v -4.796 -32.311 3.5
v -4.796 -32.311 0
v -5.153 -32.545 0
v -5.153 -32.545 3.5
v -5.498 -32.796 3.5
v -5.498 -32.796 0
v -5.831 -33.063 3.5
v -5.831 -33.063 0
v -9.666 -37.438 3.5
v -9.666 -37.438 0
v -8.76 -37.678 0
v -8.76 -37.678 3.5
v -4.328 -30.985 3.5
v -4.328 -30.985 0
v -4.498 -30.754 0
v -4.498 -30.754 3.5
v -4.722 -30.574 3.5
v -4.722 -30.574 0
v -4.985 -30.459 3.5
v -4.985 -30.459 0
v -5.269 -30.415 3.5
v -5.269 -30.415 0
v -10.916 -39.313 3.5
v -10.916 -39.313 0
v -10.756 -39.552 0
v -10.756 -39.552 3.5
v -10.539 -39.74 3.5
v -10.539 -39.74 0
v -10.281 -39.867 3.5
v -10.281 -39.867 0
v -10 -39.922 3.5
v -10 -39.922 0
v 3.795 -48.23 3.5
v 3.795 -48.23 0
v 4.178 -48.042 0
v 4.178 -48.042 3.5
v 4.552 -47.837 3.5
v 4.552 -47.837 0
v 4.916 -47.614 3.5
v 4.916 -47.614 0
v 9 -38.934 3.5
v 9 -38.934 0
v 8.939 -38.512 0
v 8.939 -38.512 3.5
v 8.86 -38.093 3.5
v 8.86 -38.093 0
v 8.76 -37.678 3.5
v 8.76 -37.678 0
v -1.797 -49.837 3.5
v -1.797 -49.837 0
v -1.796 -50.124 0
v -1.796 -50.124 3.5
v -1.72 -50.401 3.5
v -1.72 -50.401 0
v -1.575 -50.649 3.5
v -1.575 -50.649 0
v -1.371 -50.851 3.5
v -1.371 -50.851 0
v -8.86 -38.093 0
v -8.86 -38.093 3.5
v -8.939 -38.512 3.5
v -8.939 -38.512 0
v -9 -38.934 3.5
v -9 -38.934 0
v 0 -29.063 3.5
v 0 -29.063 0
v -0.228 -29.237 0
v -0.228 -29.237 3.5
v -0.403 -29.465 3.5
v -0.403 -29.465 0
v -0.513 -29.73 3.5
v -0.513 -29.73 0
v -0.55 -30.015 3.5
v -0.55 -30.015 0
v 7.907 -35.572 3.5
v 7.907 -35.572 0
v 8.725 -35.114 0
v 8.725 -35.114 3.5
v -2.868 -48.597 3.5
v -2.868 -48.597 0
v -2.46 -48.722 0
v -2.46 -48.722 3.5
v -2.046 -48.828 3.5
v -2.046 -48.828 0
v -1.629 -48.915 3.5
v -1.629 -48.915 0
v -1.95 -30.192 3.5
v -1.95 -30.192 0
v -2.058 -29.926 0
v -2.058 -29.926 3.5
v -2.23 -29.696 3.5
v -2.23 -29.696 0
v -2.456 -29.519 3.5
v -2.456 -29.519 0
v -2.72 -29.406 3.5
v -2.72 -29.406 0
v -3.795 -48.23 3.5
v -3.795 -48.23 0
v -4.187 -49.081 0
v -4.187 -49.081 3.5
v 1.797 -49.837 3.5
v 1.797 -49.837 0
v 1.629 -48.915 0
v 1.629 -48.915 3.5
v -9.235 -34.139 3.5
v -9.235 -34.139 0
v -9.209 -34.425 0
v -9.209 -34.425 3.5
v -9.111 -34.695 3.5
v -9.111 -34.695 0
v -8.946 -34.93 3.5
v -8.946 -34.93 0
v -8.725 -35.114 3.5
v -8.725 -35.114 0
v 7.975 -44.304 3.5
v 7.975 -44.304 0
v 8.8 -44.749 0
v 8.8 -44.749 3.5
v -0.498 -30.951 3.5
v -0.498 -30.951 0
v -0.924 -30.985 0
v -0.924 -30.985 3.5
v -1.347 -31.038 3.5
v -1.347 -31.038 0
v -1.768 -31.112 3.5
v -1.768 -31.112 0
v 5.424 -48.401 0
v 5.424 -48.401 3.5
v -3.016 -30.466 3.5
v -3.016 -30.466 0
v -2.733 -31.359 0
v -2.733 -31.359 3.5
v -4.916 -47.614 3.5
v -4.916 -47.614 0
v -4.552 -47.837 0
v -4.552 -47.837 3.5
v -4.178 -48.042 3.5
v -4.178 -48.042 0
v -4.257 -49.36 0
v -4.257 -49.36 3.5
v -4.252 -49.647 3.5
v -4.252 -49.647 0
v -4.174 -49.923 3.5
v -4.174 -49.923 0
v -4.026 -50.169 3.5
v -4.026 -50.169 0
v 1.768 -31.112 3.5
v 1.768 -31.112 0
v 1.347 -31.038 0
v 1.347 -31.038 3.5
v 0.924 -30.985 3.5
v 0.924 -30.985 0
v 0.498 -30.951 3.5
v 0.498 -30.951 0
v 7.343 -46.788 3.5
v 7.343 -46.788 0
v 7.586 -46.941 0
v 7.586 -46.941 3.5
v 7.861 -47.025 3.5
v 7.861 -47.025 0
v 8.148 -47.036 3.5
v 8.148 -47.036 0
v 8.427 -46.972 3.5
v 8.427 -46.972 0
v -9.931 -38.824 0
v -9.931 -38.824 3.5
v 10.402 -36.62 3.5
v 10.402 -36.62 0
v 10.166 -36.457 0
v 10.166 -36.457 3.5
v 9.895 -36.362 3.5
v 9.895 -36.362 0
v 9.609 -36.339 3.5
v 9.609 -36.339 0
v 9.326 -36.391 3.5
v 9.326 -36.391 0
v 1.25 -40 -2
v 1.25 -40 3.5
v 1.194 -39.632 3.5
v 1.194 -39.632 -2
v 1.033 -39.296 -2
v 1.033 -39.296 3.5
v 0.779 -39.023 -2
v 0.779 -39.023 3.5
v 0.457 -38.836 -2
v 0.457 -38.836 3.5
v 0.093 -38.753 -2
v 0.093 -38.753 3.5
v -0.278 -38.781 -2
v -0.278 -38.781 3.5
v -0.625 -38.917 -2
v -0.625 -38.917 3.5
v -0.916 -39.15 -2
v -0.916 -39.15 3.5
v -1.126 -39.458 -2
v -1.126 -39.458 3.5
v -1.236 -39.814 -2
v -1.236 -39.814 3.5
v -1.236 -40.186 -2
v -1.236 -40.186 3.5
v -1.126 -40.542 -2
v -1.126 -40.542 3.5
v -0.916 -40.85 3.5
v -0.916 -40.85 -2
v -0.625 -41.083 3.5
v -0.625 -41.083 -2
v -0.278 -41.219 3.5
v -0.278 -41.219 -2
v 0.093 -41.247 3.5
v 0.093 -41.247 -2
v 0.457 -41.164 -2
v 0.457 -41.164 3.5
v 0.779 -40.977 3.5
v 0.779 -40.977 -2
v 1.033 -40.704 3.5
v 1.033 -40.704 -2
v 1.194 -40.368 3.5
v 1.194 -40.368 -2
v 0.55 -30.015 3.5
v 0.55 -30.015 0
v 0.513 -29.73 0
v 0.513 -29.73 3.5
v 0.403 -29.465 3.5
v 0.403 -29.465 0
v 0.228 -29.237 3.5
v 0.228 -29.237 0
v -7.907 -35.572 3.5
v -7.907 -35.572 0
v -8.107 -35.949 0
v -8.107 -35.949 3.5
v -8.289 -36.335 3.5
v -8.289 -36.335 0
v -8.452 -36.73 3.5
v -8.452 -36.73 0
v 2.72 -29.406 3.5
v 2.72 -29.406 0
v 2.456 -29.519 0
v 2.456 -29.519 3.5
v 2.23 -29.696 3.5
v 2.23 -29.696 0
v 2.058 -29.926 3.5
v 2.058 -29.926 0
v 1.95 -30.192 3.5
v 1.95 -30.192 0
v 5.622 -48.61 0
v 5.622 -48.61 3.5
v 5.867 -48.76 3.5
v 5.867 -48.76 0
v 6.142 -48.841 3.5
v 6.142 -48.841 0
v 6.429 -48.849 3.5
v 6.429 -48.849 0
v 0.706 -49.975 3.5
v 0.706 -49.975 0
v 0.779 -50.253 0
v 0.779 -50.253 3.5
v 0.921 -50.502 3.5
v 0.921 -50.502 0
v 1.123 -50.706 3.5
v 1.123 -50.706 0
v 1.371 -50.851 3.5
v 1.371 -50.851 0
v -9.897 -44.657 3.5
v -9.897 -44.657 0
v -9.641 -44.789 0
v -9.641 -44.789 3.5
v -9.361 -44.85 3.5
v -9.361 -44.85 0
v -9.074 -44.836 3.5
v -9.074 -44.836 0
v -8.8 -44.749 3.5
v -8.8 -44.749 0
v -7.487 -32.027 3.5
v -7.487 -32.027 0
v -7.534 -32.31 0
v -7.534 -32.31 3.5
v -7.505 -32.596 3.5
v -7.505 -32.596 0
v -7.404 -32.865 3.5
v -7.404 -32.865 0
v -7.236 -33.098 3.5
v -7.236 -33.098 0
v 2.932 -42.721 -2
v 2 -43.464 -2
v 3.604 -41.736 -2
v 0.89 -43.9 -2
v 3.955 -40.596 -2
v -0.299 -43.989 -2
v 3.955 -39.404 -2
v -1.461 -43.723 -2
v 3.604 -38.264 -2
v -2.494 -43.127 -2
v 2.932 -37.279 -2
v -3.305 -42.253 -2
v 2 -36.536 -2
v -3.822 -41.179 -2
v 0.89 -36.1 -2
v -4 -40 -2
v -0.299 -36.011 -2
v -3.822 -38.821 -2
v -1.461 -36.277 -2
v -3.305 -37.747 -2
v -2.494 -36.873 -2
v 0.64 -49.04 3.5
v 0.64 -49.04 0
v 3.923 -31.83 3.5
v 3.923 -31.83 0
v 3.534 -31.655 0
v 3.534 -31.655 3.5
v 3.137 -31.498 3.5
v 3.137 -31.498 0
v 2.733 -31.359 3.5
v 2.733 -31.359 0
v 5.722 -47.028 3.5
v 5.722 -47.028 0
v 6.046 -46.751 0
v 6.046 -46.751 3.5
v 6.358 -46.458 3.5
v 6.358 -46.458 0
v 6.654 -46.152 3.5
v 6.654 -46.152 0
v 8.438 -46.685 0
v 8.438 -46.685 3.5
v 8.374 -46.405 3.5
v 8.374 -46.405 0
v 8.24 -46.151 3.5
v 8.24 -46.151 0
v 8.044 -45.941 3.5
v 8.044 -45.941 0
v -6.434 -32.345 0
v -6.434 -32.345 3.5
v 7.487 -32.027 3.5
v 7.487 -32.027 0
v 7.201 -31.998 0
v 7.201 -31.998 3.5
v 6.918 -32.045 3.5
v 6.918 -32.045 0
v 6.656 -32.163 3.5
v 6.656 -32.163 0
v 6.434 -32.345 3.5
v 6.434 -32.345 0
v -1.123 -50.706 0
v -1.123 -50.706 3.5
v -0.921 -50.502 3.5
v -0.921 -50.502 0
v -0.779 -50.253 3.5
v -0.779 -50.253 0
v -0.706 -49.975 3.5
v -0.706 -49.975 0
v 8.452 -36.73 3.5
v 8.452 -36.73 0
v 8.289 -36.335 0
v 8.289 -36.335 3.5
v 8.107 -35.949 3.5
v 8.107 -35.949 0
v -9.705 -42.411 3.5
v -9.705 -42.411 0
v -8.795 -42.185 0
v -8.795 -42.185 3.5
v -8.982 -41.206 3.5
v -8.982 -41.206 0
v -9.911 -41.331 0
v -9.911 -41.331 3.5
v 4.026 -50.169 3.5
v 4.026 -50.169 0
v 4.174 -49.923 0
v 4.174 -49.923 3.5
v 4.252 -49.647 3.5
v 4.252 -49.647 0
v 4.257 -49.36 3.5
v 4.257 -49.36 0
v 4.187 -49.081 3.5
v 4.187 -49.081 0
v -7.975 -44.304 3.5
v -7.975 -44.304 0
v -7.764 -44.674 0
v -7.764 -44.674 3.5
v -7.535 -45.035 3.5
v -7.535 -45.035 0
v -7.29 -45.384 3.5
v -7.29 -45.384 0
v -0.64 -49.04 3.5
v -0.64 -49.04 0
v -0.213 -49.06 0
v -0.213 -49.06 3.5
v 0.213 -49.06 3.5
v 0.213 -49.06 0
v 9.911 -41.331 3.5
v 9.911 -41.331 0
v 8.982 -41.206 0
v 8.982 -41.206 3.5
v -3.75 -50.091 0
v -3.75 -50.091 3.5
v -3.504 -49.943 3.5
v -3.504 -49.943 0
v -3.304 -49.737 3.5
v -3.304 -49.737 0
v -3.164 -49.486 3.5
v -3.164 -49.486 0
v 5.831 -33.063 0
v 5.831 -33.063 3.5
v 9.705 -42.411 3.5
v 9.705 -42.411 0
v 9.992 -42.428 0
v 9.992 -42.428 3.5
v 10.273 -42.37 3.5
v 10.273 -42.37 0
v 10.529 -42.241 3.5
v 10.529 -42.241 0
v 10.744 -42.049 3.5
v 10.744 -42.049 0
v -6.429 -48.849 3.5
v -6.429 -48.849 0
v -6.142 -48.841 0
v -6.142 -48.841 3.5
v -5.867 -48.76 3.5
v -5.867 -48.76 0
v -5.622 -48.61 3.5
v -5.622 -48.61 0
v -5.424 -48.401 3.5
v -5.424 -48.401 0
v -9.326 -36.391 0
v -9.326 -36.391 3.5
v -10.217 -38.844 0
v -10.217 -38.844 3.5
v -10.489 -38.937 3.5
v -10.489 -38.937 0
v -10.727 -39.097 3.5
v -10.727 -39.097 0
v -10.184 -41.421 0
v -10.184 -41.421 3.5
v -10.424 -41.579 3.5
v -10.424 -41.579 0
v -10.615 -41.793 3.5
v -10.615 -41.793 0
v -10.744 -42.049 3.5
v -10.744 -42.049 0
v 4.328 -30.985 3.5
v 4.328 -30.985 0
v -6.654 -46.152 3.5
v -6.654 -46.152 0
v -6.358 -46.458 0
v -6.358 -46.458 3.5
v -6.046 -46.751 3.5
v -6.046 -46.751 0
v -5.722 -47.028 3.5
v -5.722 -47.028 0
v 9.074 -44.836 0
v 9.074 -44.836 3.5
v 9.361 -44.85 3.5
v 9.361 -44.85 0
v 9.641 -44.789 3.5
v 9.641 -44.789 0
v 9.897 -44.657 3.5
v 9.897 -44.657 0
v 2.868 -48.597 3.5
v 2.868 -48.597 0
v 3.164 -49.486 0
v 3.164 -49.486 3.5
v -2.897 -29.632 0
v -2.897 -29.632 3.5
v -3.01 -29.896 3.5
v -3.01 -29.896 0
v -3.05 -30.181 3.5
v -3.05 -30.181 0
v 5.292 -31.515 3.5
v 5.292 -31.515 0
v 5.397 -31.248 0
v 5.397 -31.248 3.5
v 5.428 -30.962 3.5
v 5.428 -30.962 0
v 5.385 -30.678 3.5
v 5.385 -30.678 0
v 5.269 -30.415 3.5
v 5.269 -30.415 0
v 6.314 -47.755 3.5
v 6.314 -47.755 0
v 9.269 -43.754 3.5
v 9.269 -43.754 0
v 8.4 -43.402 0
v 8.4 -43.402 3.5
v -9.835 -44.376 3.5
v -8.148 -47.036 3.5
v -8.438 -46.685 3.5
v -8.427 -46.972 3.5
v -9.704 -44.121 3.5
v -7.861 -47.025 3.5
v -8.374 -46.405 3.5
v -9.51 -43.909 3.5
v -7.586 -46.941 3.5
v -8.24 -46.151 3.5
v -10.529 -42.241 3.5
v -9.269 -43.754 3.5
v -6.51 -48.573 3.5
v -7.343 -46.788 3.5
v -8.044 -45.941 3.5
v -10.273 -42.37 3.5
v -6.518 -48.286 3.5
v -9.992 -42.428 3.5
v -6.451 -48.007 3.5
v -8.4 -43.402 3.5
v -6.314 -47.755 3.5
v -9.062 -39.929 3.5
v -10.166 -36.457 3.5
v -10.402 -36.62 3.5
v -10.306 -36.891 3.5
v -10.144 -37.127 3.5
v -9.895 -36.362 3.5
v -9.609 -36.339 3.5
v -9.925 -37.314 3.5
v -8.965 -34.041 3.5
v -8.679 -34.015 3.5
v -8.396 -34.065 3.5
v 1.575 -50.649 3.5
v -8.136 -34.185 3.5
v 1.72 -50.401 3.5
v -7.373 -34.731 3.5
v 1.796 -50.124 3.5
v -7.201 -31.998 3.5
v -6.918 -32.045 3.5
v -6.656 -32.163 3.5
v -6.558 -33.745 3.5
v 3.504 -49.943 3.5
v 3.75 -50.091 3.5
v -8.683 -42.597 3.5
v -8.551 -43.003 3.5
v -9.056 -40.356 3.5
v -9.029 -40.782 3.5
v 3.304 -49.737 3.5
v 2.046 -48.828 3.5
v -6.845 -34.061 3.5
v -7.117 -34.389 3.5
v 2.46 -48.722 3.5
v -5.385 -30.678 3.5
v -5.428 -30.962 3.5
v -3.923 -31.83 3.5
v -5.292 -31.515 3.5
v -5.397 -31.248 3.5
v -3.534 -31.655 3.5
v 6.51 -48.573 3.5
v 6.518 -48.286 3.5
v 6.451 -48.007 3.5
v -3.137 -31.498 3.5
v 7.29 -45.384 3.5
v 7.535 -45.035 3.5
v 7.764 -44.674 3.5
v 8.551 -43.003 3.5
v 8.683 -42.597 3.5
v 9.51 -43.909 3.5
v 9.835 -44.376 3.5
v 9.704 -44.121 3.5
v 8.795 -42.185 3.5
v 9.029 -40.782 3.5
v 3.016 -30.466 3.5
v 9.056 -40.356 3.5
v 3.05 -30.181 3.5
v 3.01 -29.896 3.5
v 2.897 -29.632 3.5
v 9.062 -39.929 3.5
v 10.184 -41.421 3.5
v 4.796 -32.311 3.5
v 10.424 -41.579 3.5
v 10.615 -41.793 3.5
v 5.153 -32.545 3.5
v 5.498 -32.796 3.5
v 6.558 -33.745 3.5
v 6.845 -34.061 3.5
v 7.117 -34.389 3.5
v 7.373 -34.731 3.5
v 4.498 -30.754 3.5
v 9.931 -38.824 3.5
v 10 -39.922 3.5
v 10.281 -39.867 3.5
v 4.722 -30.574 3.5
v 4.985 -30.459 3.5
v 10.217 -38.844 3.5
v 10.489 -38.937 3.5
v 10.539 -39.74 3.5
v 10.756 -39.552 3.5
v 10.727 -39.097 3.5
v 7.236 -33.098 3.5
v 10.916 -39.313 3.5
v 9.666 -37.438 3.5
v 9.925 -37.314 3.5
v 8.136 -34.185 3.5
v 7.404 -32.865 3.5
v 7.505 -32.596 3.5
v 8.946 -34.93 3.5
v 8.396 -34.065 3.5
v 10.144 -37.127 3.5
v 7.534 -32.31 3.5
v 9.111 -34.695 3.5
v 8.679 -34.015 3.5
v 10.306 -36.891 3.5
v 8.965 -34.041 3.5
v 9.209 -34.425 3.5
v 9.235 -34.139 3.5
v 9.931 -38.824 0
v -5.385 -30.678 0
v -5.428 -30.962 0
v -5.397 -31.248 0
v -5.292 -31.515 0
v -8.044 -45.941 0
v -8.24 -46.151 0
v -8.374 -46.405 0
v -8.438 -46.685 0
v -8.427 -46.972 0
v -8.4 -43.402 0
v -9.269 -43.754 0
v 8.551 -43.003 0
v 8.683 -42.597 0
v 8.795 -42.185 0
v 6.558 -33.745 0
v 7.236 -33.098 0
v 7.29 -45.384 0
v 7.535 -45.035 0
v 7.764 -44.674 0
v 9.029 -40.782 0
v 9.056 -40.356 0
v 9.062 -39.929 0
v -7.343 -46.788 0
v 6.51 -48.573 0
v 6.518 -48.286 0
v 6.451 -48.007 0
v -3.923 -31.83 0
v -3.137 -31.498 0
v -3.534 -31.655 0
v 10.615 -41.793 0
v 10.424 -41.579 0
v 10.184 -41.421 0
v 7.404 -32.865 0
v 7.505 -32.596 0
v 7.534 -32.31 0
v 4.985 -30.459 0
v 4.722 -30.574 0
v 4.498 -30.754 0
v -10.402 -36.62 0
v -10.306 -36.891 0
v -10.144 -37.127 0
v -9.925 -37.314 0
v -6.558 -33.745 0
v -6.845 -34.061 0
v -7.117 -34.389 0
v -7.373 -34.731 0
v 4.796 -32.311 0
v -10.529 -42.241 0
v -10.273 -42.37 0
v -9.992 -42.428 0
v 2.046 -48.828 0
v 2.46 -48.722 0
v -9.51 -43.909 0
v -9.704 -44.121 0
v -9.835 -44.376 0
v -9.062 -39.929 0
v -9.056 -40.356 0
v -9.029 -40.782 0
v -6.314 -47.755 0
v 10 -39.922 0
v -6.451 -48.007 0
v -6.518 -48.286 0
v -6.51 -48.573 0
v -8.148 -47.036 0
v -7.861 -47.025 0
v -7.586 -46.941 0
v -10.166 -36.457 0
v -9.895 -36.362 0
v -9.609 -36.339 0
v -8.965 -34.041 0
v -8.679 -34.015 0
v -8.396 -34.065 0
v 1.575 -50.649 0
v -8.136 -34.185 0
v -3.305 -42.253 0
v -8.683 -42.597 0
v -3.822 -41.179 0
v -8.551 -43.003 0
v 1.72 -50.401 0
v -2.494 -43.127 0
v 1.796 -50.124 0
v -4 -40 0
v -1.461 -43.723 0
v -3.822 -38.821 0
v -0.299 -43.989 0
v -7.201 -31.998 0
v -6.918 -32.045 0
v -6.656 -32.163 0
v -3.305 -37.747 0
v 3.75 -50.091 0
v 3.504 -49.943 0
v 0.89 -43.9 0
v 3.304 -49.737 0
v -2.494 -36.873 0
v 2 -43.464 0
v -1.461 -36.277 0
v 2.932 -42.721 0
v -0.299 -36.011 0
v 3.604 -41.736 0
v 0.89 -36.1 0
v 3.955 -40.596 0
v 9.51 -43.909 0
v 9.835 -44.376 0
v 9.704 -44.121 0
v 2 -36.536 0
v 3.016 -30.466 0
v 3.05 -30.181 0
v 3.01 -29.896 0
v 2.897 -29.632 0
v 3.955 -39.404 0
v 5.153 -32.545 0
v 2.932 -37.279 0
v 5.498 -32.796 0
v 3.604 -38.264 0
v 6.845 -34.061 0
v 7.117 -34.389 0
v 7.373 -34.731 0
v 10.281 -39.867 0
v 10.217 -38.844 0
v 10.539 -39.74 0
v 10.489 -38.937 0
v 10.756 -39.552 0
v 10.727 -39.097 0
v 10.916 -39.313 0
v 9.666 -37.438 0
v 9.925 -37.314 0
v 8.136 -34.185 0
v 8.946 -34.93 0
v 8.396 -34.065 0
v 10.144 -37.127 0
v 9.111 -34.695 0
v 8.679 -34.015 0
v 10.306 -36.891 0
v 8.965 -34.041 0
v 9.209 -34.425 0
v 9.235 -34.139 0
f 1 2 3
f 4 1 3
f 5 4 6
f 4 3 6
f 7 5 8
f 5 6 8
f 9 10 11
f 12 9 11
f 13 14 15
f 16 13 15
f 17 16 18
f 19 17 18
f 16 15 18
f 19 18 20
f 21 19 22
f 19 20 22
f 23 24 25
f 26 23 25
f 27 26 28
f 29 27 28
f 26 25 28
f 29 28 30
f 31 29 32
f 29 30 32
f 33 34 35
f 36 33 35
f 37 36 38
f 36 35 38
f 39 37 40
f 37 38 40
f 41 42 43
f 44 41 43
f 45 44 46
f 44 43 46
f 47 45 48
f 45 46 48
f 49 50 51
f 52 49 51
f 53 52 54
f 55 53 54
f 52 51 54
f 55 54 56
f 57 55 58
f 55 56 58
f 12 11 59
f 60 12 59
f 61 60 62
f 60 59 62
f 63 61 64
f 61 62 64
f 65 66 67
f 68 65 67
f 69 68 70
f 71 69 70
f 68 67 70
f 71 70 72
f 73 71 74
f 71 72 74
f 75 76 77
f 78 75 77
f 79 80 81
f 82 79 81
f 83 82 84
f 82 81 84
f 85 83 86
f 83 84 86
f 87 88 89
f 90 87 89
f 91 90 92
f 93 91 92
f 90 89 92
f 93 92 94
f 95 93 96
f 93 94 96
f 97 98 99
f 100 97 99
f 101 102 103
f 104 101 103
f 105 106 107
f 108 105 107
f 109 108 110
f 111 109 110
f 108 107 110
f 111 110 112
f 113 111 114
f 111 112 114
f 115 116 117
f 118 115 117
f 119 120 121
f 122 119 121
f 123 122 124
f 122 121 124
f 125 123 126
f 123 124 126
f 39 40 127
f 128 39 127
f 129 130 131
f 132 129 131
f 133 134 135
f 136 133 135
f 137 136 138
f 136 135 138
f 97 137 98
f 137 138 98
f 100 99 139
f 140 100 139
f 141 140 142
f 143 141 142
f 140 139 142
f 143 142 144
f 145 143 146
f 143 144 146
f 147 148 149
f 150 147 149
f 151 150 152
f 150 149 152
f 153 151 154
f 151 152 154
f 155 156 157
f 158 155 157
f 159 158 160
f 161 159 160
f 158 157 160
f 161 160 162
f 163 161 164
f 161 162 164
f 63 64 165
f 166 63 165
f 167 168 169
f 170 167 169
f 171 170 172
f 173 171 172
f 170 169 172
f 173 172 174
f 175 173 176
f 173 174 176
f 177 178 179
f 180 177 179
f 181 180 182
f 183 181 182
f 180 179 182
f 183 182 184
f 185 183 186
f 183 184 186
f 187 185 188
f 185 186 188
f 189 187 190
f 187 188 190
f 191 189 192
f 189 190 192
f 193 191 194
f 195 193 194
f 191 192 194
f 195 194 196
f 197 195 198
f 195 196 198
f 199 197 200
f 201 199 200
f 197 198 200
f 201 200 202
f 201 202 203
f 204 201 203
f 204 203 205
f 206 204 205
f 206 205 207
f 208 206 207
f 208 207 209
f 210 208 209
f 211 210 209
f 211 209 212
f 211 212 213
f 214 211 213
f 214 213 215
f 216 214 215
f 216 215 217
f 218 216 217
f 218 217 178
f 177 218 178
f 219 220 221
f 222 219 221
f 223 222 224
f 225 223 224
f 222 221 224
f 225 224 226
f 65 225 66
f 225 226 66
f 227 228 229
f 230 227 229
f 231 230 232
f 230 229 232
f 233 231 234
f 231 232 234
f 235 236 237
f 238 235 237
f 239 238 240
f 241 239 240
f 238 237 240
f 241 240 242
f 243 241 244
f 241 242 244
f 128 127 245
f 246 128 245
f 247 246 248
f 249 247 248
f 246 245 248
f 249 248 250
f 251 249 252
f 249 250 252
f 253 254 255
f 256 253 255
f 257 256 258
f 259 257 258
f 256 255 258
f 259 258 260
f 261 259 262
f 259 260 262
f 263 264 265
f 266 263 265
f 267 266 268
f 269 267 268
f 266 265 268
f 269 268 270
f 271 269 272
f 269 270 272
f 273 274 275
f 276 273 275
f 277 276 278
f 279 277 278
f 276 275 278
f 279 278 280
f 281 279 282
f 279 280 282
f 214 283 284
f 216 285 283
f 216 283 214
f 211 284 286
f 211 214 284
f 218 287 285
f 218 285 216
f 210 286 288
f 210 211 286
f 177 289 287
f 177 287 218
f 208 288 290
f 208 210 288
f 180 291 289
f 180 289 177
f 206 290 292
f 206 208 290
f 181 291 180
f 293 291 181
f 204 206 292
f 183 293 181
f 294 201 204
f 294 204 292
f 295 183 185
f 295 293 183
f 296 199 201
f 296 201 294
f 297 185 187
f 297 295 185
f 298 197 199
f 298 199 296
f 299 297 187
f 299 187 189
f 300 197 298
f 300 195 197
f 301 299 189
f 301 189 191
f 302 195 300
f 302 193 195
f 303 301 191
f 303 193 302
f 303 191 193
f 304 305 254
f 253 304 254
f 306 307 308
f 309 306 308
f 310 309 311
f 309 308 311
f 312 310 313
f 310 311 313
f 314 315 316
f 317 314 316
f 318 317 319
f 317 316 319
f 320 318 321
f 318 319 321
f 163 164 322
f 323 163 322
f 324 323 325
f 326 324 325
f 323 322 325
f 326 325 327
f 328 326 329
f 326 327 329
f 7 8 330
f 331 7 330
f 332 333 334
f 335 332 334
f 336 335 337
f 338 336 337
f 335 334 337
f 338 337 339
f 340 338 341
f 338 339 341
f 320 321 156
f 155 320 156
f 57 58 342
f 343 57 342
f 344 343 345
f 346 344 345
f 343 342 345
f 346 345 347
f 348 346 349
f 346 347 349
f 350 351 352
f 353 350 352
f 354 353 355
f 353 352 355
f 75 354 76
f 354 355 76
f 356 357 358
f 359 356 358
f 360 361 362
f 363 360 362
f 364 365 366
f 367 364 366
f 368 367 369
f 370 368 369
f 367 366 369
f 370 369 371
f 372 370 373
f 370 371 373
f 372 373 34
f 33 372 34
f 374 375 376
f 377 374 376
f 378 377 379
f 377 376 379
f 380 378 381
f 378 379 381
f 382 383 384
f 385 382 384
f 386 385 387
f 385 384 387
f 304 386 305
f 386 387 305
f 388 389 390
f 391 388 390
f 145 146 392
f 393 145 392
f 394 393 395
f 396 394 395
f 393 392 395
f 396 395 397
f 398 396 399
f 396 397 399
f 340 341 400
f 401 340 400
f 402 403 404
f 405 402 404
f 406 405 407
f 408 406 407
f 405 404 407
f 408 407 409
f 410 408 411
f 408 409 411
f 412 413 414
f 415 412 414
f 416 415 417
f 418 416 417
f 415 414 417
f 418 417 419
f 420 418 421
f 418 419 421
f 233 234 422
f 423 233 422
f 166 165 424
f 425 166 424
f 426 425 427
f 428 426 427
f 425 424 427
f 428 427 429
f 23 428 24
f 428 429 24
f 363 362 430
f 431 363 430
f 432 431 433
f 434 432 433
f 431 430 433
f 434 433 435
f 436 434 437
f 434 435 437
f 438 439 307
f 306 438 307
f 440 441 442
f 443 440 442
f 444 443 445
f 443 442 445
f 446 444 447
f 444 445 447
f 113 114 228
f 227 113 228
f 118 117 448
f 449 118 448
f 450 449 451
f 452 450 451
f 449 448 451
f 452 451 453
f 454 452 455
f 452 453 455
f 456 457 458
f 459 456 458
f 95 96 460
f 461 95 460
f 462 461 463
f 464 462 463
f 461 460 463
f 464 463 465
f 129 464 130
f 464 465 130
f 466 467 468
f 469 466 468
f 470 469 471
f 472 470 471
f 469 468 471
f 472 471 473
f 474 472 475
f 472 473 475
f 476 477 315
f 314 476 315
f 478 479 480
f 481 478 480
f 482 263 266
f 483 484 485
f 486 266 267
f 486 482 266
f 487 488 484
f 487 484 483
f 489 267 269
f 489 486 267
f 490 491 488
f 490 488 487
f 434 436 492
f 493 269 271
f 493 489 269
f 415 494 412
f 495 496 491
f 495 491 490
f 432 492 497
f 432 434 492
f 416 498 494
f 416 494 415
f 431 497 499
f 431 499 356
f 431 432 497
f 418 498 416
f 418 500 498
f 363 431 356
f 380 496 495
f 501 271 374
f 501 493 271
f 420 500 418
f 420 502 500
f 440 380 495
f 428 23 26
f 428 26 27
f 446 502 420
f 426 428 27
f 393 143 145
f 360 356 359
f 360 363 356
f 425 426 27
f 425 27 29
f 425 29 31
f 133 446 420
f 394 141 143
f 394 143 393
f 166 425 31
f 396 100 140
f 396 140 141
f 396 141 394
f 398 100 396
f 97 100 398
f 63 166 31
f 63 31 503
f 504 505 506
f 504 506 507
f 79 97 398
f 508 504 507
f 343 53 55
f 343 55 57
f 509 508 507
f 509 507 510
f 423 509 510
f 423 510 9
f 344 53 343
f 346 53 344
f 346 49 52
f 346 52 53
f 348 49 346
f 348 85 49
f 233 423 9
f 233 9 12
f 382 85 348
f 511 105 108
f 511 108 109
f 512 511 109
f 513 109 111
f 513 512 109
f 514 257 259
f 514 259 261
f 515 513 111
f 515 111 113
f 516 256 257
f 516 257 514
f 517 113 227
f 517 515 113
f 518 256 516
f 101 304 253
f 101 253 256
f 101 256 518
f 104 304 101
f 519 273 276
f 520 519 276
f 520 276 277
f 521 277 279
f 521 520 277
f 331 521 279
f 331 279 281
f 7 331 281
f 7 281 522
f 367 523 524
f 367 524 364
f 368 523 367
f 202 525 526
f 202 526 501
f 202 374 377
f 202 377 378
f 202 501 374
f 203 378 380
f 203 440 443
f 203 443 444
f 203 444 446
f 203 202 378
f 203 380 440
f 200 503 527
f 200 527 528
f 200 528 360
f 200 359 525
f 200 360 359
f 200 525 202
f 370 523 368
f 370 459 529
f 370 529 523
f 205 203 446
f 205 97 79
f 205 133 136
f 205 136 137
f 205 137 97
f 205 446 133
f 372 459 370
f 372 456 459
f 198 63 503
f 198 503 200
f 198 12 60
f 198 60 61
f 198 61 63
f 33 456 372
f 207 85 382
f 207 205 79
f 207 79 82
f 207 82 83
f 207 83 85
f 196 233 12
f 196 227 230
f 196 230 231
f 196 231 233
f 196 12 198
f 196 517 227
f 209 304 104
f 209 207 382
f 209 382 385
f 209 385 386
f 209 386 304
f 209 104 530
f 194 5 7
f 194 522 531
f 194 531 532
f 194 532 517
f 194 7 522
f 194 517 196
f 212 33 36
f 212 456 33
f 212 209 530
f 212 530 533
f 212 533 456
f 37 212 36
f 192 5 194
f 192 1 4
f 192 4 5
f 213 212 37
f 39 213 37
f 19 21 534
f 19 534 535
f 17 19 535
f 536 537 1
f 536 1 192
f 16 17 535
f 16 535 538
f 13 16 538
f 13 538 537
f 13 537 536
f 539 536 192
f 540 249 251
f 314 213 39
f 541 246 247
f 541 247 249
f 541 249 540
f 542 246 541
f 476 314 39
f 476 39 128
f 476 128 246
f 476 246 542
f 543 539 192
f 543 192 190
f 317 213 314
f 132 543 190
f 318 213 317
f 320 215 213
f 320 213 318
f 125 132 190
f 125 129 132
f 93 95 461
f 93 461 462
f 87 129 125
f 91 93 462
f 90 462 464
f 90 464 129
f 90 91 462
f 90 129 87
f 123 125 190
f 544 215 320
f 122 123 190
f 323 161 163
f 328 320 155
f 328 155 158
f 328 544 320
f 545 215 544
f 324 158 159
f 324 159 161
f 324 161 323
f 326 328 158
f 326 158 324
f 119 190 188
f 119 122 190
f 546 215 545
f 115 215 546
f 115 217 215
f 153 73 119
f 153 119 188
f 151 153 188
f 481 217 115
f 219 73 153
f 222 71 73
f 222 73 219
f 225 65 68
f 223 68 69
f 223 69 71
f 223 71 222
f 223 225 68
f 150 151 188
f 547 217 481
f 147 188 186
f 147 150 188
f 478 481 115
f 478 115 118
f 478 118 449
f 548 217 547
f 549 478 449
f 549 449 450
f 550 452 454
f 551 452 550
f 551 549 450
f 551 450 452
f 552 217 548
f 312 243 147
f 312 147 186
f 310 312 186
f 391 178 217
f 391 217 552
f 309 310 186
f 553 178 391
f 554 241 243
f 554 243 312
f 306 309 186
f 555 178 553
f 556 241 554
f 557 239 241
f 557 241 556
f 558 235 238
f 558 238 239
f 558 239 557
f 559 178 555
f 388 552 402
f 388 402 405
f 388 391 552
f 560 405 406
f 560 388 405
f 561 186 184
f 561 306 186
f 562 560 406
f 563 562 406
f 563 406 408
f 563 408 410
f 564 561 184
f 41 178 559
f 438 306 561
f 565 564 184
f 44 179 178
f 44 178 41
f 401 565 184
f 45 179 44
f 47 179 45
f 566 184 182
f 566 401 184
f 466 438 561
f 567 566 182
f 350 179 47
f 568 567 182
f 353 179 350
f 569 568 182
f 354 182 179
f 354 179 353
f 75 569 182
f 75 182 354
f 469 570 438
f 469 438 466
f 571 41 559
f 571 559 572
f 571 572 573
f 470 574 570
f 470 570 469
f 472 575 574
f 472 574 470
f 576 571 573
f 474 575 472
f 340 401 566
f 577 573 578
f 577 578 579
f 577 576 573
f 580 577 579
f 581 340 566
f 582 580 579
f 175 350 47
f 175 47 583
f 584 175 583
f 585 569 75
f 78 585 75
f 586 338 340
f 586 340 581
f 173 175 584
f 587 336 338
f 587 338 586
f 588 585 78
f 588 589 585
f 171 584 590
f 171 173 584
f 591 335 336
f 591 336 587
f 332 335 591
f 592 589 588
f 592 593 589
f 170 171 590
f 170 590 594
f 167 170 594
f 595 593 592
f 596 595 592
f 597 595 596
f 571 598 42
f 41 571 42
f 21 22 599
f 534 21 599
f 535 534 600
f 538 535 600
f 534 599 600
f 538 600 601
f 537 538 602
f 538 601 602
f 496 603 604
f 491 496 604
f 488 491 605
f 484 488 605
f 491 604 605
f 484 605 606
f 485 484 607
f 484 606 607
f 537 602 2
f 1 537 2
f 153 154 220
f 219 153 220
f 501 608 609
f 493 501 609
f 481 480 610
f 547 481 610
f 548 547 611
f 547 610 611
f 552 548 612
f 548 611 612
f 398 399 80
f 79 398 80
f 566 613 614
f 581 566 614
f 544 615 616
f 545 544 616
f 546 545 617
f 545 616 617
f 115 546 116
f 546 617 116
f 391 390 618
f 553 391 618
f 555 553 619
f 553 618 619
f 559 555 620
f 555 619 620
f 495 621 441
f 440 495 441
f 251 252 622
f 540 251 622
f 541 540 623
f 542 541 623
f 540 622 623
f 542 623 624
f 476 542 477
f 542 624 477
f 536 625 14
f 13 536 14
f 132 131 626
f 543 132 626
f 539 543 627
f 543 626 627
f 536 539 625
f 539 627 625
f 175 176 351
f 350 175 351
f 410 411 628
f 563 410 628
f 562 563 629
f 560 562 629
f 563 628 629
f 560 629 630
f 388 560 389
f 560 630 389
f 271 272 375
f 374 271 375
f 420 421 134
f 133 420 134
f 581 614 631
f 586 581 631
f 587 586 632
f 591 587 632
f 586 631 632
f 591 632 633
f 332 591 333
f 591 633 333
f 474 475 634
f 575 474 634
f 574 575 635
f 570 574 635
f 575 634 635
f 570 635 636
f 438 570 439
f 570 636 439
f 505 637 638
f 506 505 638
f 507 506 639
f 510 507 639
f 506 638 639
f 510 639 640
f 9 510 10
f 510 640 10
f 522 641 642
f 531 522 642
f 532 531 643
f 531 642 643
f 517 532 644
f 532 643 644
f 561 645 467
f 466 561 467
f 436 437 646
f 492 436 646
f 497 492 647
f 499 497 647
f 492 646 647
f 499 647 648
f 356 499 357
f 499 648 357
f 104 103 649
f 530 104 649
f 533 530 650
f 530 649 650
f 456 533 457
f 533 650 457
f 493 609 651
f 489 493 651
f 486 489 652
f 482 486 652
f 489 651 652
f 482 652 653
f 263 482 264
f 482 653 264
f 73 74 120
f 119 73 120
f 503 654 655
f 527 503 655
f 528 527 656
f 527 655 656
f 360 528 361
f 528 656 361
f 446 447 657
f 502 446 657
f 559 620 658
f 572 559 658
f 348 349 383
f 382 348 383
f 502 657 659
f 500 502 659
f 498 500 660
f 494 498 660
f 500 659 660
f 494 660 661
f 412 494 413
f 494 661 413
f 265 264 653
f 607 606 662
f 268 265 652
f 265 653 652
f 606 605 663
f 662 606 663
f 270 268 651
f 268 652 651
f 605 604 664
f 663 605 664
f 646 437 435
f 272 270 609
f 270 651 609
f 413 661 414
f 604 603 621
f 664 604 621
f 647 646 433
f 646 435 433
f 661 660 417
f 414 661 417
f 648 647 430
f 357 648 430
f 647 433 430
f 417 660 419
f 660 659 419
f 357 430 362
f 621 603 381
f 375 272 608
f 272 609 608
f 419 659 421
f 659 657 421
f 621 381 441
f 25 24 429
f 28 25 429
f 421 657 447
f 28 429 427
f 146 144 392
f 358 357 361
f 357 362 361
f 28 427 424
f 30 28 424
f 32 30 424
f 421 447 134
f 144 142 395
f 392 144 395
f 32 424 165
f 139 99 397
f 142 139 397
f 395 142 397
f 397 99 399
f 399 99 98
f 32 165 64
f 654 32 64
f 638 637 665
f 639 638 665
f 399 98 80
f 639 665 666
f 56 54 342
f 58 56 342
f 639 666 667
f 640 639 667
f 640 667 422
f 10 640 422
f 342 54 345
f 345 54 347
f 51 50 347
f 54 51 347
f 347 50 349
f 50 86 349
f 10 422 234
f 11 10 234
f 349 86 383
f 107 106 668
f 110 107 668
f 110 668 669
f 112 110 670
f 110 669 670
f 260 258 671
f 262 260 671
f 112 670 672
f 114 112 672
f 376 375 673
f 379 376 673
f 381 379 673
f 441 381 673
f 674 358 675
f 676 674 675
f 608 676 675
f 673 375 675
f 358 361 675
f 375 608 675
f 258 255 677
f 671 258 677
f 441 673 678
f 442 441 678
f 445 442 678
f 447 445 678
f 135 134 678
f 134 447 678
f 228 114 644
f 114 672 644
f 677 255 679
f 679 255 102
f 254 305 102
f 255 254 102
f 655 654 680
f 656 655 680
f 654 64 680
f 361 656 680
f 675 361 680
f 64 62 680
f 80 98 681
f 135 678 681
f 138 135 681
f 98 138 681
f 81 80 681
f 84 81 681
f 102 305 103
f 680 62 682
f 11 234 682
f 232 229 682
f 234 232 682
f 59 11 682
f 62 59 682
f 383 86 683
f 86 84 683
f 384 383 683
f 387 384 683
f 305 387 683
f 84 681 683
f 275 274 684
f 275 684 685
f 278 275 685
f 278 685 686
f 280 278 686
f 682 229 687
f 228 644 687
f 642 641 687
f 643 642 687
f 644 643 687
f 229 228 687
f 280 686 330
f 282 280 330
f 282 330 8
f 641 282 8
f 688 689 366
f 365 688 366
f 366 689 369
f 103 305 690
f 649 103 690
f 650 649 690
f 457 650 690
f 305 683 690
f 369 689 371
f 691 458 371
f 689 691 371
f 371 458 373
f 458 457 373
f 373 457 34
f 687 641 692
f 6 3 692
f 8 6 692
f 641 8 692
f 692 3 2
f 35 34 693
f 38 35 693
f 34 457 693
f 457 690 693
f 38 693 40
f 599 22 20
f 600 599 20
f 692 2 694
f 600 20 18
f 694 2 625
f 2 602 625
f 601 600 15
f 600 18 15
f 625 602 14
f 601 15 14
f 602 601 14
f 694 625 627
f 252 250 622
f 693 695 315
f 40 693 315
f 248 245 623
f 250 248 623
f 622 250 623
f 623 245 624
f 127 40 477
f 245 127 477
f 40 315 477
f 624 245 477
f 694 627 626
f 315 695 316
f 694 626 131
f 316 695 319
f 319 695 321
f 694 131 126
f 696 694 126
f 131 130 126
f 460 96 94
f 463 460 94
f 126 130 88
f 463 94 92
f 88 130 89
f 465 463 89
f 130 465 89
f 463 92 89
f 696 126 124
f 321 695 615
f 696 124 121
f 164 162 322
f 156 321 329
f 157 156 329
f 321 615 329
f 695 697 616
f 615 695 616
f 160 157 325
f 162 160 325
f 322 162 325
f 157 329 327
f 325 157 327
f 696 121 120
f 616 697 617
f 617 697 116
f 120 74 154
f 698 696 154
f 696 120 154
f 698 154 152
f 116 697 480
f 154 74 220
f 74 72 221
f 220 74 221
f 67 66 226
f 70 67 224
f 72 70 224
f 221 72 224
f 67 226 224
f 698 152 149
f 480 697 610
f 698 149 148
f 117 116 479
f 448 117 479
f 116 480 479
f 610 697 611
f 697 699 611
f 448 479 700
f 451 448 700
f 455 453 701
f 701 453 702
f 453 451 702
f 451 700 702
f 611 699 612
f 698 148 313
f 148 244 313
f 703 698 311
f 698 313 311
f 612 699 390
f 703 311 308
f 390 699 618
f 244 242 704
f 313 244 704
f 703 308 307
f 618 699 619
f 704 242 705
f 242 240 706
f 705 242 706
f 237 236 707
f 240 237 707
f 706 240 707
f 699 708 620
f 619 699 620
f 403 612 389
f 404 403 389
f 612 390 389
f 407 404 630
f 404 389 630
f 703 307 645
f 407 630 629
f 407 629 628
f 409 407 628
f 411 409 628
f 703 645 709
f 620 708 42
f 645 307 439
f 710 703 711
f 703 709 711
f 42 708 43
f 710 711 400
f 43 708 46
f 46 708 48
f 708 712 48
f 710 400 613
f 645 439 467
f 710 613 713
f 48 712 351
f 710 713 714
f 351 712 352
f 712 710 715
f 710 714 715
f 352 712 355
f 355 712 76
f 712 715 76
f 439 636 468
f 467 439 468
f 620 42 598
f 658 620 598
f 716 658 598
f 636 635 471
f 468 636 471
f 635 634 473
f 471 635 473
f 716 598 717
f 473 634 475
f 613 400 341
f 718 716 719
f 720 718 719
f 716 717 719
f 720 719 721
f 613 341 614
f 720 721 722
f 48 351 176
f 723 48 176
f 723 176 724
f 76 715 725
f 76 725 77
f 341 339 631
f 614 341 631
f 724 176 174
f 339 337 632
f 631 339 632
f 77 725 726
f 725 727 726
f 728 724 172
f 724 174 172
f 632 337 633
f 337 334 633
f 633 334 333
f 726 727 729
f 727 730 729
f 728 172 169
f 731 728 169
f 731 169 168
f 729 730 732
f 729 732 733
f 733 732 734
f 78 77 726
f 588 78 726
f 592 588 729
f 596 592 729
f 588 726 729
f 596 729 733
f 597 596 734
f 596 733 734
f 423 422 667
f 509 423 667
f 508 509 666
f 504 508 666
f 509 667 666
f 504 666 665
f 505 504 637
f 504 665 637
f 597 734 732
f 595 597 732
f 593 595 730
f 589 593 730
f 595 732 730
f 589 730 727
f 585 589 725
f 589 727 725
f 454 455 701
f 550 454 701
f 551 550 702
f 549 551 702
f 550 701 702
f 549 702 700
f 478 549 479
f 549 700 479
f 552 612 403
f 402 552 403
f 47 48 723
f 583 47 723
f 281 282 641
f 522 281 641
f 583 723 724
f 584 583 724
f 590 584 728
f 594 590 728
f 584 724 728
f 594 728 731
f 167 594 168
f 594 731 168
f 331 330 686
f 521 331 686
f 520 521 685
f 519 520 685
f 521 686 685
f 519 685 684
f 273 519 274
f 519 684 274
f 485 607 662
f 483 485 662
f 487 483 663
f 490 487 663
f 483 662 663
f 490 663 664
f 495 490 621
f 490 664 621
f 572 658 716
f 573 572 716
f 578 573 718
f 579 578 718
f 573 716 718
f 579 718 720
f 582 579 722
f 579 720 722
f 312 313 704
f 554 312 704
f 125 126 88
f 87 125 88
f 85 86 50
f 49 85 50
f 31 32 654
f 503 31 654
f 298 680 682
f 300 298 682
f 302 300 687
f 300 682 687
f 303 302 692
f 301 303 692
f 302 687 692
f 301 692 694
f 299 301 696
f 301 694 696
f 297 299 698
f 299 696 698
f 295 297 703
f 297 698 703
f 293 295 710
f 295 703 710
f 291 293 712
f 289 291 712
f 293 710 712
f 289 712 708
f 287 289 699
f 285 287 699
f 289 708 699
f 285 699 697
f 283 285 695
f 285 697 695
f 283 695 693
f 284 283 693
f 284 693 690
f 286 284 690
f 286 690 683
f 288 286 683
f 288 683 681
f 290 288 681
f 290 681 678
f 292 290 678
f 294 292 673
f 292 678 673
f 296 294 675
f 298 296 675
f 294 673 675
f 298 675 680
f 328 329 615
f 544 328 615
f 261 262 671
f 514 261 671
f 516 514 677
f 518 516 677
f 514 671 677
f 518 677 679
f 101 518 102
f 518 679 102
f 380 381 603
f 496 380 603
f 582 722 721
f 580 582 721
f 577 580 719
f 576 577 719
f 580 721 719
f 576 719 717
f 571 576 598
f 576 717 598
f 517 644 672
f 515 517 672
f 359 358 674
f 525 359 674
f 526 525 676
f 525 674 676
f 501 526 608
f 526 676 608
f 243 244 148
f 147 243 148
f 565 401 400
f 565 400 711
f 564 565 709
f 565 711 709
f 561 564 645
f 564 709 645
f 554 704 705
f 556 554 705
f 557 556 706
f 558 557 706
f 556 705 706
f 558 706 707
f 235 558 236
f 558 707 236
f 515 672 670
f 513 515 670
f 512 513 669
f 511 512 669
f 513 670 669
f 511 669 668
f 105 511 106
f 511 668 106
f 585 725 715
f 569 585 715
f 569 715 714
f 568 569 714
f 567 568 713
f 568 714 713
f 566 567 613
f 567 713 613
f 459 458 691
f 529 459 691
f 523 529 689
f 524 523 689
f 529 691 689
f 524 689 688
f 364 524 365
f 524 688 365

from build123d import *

# Parameters (mm, degrees)
SKETCH1_R           = 9.062508511
BOSS_EXTRUDE1_DEPTH = 3.5
CIRPATTERN1_COUNT   = 25
SKETCH3_R           = 4
BOSS_EXTRUDE2_DEPTH = 2
SKETCH2_R           = 1.25
CUT_EXTRUDE1_DEPTH  = 6.5


with BuildPart() as part:
    # Sketch1 → Boss-Extrude1 (new body)
    with BuildSketch(Plane.XY):
        with BuildLine():
            ThreePointArc((0, -29.062508511), (-0.402627944, -29.465136456), (-0.55, -30.015136456))
            Line((-0.55, -30.015136456), (-0.498437968, -30.951208914))
            ThreePointArc((-0.498437968, -30.951208914), (0, -30.937491489), (0.498437968, -30.951208914))
            Line((0.498437968, -30.951208914), (0.55, -30.015136456))
            ThreePointArc((0.55, -30.015136456), (0.402627944, -29.465136456), (0, -29.062508511))
        make_face()
        with Locations((0, -40)):
            Circle(SKETCH1_R)
    boss_extrude1 = extrude(amount=BOSS_EXTRUDE1_DEPTH)

    # CirPattern1: Boss-Extrude1 ×25 about axis
    cirpattern1_axis = Axis((0, -40, 0), (0, 0, 1))
    for i in range(1, CIRPATTERN1_COUNT):
        add(boss_extrude1.rotate(cirpattern1_axis, i * 360 / CIRPATTERN1_COUNT))

    # Sketch3 → Boss-Extrude2 (add)
    with BuildSketch(Plane(origin=(0, 0, 0), x_dir=(-1, 0, 0), z_dir=(0, 0, -1))):
        with Locations((0, -40)):
            Circle(SKETCH3_R)
    extrude(amount=BOSS_EXTRUDE2_DEPTH)

    # Sketch2 → Cut-Extrude1 (cut, through all)
    with BuildSketch(Plane.XY.offset(3.5)):
        with Locations((0, -40)):
            Circle(SKETCH2_R)
    extrude(amount=-CUT_EXTRUDE1_DEPTH, mode=Mode.SUBTRACT)


solid = part.part
